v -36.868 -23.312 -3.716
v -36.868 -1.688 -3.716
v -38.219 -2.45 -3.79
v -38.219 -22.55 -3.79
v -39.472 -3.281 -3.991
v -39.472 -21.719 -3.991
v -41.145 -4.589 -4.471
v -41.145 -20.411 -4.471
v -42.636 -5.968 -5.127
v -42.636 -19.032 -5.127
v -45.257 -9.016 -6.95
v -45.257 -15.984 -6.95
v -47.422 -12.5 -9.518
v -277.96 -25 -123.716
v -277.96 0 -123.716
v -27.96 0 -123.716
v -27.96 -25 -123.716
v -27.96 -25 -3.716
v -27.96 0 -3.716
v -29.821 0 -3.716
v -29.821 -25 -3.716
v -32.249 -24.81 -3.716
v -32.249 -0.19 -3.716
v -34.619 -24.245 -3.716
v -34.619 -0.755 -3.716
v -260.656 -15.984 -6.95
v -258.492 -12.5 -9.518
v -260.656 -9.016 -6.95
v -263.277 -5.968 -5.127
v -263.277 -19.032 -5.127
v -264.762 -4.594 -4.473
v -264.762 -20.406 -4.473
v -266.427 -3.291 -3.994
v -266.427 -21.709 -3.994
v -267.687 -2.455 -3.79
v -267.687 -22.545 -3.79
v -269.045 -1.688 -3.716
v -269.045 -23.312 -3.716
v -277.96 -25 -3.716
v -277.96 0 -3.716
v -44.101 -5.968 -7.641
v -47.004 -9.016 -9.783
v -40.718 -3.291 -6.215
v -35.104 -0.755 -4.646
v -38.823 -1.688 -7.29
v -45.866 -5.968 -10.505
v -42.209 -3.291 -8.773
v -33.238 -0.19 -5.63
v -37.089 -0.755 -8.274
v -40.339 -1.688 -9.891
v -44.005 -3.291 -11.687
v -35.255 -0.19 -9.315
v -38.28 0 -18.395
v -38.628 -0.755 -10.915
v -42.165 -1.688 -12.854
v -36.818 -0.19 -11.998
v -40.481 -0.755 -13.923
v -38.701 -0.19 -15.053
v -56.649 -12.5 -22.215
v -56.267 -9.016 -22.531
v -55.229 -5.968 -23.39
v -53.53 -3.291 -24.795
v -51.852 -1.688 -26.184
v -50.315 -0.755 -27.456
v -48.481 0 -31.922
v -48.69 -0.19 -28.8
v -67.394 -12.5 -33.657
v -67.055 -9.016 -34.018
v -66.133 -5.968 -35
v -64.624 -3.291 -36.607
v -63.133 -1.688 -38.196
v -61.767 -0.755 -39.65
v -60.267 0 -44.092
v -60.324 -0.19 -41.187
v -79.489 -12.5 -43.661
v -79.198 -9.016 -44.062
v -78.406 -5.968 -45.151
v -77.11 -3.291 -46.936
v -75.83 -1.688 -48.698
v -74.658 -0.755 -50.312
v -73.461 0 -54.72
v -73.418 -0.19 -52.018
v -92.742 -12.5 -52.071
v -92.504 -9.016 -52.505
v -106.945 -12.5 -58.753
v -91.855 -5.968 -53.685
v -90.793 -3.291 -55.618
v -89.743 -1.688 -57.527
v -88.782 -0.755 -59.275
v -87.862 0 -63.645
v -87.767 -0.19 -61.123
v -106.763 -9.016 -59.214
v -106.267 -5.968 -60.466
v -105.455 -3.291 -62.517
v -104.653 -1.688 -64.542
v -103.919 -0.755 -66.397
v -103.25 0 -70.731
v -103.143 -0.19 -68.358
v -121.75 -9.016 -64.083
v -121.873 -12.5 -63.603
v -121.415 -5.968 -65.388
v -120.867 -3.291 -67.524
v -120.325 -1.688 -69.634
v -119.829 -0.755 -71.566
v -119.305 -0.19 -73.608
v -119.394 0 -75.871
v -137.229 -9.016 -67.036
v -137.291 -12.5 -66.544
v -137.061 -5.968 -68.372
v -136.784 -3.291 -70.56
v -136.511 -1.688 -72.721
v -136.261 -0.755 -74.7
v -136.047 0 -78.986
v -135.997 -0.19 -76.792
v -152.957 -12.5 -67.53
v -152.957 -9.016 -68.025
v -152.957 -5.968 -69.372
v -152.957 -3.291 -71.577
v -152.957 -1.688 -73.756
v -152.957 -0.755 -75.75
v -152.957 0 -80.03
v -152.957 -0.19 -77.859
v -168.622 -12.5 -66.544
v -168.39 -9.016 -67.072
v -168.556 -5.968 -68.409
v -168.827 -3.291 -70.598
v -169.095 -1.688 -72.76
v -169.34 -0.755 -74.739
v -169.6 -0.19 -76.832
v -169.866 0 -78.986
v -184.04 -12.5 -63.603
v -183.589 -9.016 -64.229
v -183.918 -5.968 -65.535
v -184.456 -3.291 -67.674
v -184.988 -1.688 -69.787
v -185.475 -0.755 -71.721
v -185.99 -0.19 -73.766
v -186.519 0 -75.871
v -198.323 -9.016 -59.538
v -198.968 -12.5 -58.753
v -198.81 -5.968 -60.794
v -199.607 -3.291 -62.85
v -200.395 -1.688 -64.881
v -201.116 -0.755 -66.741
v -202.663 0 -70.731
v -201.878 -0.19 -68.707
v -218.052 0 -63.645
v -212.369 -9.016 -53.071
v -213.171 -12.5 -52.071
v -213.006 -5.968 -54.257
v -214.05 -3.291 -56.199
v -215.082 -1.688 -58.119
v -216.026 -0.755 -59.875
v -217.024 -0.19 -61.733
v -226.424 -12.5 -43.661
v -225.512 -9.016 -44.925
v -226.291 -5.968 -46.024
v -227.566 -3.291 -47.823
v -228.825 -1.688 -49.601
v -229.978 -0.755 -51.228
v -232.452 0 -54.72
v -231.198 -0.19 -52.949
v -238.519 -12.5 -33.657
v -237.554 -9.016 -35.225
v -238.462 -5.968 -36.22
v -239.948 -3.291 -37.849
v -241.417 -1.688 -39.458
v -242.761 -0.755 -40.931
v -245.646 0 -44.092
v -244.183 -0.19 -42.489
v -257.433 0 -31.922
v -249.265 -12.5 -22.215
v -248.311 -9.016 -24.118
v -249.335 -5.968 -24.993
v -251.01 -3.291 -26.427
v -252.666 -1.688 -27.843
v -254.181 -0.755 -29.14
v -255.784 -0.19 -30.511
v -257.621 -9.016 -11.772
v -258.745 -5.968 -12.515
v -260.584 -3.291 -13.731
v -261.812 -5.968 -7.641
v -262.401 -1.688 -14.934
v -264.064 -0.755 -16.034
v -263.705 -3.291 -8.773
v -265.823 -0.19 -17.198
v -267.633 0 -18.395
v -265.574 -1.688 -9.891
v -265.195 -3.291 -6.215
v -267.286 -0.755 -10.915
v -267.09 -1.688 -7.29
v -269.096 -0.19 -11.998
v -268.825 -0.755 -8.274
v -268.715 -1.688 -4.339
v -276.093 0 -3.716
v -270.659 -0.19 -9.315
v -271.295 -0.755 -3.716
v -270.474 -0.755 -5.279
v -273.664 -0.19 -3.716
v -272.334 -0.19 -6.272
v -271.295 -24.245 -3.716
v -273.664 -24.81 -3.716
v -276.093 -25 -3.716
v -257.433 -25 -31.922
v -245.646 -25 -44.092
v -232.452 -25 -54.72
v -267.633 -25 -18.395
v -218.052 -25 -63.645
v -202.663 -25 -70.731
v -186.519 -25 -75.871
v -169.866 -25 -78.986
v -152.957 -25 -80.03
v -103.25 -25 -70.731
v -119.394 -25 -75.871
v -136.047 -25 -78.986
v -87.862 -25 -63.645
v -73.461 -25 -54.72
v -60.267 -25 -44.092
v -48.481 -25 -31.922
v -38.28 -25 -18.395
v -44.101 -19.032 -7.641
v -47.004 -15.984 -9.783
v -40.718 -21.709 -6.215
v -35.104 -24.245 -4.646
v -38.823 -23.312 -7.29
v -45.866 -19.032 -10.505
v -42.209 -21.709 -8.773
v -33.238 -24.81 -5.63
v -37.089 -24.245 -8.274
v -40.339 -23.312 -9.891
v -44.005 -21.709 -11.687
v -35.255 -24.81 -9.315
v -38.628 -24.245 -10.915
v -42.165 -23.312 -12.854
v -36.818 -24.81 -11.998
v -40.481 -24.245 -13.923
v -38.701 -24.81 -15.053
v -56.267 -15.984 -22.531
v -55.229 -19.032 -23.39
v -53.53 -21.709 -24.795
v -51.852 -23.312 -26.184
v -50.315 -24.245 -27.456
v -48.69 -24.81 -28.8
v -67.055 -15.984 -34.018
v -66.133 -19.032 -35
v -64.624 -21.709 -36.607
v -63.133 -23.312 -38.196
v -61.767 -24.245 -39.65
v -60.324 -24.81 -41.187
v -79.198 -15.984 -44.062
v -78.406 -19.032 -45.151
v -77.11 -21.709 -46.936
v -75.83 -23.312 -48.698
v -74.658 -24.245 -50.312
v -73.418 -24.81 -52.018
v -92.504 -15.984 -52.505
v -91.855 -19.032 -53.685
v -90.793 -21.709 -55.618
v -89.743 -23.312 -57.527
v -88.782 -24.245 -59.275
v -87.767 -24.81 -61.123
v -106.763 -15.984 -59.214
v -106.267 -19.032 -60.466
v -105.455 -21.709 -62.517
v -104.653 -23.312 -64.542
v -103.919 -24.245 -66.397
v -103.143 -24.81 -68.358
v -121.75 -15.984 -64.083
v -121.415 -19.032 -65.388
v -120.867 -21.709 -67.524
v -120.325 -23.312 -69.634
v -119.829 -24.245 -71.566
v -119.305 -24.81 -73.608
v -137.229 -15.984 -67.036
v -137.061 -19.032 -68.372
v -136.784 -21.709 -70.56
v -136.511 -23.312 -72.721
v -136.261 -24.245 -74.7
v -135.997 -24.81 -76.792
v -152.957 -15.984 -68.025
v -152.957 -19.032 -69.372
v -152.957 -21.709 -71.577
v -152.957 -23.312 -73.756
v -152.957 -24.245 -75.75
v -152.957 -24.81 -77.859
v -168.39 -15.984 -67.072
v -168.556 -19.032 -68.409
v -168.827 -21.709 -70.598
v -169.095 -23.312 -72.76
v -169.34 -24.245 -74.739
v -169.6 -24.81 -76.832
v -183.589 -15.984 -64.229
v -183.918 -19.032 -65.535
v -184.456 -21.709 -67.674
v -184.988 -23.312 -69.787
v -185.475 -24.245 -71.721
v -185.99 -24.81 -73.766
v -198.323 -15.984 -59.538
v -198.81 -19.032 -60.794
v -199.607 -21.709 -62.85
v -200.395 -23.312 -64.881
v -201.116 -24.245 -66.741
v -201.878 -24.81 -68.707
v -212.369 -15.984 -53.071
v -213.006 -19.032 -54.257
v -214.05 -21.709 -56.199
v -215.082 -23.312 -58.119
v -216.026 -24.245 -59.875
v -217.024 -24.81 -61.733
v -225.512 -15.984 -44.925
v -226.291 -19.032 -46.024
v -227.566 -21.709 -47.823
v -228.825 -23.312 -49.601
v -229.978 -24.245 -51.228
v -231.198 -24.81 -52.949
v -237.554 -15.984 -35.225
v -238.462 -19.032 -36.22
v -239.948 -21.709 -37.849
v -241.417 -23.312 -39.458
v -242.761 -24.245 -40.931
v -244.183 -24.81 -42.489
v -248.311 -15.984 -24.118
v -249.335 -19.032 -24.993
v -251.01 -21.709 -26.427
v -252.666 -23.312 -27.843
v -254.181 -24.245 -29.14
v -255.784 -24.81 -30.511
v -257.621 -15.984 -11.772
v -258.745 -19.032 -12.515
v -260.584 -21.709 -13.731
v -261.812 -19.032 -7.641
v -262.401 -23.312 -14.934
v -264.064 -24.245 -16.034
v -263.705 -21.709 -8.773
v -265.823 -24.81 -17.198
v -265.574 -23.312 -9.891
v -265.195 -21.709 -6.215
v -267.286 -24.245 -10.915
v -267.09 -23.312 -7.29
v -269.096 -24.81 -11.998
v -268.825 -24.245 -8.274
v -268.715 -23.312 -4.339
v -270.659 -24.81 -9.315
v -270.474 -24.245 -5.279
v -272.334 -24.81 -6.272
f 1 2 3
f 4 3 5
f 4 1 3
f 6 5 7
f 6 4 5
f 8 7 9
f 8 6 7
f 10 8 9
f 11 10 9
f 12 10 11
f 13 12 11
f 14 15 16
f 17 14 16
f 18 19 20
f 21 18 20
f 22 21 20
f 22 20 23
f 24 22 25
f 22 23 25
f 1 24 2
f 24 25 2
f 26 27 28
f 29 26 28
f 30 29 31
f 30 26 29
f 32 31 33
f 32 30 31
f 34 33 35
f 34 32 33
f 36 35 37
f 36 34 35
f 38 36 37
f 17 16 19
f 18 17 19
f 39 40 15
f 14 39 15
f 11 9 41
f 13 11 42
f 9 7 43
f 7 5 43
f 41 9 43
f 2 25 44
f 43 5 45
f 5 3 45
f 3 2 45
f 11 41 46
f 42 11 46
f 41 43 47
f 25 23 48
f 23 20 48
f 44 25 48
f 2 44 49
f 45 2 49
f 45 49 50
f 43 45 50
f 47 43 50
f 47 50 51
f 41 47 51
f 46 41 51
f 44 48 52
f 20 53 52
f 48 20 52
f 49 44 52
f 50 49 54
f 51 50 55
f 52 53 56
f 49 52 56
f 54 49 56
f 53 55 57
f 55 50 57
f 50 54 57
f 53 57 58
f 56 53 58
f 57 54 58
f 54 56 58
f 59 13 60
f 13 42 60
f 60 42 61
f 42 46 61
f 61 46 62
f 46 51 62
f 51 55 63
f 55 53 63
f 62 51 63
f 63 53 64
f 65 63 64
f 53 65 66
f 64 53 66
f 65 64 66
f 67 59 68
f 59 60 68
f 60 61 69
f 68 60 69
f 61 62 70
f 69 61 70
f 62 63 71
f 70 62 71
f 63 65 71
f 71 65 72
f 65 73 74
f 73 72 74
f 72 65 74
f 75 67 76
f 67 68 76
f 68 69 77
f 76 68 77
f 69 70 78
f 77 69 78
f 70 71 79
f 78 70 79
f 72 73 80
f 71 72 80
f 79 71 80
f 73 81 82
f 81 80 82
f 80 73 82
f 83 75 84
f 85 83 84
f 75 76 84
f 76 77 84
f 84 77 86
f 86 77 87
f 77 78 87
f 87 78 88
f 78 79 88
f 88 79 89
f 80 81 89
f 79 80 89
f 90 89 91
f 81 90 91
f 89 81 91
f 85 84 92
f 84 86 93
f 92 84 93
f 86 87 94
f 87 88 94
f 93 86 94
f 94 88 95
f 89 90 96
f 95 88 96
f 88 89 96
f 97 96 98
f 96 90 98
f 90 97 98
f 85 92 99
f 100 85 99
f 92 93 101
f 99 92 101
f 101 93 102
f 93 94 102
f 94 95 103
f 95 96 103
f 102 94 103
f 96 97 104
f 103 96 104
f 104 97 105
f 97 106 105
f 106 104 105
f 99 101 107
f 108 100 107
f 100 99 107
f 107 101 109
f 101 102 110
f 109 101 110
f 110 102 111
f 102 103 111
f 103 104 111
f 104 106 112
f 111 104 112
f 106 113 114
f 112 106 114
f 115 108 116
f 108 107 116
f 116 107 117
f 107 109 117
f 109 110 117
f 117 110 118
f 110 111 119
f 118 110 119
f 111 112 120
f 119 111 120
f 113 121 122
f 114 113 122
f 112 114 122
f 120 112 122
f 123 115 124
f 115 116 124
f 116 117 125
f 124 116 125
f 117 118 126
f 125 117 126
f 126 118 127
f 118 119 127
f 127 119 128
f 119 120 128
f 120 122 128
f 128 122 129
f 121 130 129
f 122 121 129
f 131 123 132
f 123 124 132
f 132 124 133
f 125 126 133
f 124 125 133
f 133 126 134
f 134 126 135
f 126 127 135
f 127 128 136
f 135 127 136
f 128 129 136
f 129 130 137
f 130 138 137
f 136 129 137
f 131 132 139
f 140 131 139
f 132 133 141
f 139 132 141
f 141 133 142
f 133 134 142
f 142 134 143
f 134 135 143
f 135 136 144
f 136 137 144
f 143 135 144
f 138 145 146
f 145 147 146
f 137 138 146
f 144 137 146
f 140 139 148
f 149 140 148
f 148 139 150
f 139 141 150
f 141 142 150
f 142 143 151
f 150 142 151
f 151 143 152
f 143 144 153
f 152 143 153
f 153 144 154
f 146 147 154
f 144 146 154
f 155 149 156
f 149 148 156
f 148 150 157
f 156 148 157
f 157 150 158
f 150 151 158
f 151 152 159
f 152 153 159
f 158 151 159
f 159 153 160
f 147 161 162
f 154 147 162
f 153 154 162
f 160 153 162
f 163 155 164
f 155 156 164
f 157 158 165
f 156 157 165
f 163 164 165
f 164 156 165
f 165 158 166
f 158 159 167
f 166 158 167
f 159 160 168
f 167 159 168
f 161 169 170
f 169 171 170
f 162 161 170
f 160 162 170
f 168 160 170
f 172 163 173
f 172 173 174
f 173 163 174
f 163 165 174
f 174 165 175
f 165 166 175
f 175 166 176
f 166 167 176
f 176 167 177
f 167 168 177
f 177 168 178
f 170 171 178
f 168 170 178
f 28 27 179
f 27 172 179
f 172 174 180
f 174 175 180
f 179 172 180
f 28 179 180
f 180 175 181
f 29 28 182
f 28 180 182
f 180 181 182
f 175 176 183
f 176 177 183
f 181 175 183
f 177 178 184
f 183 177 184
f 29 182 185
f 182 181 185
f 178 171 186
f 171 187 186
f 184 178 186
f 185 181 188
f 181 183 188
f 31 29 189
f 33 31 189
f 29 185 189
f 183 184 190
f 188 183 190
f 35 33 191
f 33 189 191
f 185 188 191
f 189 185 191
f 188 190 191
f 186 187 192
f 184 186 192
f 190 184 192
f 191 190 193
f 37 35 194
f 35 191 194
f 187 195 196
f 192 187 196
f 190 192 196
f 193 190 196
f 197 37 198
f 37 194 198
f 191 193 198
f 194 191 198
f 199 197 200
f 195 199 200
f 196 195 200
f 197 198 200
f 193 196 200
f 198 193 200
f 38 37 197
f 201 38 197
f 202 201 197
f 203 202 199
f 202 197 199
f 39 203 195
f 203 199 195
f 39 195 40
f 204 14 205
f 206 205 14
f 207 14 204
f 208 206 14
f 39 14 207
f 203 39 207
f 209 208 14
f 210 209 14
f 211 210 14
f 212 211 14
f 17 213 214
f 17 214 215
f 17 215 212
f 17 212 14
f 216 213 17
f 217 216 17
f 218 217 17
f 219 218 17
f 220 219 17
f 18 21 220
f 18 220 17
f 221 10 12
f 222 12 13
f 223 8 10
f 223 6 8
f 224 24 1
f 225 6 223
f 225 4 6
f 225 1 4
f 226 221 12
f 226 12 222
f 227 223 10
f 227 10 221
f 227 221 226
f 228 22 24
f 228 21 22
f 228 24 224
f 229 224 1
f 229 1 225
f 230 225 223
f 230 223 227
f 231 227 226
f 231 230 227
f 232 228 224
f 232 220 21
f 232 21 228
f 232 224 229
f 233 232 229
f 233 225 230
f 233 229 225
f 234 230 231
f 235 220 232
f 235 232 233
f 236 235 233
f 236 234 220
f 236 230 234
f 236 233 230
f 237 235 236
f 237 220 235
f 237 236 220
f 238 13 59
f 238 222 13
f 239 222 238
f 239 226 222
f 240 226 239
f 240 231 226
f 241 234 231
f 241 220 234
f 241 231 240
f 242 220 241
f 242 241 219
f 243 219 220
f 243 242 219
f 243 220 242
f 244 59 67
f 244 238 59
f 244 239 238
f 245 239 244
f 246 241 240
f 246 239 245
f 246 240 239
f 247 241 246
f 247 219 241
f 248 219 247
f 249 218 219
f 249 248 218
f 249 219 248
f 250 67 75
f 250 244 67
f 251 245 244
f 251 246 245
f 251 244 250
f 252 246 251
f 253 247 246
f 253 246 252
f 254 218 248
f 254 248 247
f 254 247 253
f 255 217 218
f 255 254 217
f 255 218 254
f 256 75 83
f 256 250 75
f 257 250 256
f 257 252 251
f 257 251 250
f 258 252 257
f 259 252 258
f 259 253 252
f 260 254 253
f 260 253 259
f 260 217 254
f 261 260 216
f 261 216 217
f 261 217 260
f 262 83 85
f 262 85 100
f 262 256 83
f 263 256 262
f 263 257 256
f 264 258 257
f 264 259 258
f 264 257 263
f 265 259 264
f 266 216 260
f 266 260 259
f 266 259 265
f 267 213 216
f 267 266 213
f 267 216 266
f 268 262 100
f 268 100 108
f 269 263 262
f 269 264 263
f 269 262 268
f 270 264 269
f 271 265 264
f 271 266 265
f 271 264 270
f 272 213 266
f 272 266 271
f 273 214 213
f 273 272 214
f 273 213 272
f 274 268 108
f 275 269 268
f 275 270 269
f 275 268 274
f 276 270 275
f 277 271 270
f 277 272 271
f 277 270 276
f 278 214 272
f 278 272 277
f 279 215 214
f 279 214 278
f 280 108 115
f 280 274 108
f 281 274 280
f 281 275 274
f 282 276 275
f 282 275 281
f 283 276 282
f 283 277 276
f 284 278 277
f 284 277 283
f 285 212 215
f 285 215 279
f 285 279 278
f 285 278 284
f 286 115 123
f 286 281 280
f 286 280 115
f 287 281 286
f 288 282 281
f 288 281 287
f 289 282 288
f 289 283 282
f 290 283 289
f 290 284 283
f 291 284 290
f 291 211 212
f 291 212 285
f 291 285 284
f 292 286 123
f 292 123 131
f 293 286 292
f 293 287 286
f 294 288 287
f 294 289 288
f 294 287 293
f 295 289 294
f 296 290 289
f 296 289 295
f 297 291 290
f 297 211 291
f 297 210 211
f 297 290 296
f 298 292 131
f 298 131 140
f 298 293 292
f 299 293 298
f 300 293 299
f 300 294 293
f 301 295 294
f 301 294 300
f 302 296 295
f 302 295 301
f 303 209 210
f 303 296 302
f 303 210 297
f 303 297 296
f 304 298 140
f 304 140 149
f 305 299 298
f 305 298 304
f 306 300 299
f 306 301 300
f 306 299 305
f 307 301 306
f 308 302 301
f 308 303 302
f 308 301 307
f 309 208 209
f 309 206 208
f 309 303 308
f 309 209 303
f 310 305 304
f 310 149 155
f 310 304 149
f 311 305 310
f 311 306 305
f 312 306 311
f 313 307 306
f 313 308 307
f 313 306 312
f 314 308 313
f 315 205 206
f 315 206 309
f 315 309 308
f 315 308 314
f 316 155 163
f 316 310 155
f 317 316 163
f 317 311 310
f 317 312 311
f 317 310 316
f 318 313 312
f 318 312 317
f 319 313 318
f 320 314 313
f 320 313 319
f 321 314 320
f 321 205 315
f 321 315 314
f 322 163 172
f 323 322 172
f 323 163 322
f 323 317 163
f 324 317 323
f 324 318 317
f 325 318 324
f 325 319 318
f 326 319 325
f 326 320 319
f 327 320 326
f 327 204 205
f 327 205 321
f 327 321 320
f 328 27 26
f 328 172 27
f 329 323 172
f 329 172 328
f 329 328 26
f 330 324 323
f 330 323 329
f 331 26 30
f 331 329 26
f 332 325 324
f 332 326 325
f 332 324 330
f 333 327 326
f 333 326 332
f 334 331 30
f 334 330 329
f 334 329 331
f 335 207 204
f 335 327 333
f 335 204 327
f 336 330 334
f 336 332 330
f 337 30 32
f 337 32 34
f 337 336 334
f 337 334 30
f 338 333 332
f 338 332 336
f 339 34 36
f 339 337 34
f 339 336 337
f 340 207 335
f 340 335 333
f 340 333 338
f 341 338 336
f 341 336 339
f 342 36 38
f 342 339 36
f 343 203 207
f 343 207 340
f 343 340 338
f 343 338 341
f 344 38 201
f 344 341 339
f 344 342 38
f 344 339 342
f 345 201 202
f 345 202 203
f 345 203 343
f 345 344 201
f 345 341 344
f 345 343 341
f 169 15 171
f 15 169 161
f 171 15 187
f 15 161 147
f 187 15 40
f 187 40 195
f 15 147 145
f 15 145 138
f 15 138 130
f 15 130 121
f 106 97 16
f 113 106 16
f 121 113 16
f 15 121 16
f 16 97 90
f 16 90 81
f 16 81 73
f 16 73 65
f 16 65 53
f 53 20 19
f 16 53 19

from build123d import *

# Parameters (mm, degrees)
F1_DEPTH = 25
F2_R     = 12.49999


# Not quite as in the source:
# - a fillet or chamfer is up to 0.001 mm smaller than in the source, because OpenCascade refuses the exact size


with BuildPart() as f1:
    # F0 (on Front) → F1 (new body)
    with BuildSketch(Plane.XZ):
        with BuildLine():
            Line((-277.959928672, -3.7163552741), (-277.959928672, -123.7163552741))
            Line((-277.959928672, -123.7163552741), (-27.959928672, -123.7163552741))
            Line((-27.959928672, -123.7163552741), (-27.959928672, -3.7163552741))
            Line((-27.959928672, -3.7163552741), (-43.9558270226, -3.7163552741))
            ThreePointArc((-43.9558270226, -3.7163552741), (-152.9567080066, -67.529690512), (-261.9575889906, -3.7163552741))
            Line((-261.9575889906, -3.7163552741), (-277.959928672, -3.7163552741))
        make_face()
    extrude(amount=F1_DEPTH)

    # F2 (radius 12.5 in the source; OpenCascade refuses exactly that, so slightly less here)
    f2_edges = [f1.edges().sort_by_distance(p)[0] for p in [
        (-261.957589, -12.5, -3.716355),
        (-43.955827, -12.5, -3.716355),
        (-152.956708, -25, -67.529691),
        (-152.956708, 0, -67.529691),
    ]]
    fillet(f2_edges, radius=F2_R)


solid = f1.part
